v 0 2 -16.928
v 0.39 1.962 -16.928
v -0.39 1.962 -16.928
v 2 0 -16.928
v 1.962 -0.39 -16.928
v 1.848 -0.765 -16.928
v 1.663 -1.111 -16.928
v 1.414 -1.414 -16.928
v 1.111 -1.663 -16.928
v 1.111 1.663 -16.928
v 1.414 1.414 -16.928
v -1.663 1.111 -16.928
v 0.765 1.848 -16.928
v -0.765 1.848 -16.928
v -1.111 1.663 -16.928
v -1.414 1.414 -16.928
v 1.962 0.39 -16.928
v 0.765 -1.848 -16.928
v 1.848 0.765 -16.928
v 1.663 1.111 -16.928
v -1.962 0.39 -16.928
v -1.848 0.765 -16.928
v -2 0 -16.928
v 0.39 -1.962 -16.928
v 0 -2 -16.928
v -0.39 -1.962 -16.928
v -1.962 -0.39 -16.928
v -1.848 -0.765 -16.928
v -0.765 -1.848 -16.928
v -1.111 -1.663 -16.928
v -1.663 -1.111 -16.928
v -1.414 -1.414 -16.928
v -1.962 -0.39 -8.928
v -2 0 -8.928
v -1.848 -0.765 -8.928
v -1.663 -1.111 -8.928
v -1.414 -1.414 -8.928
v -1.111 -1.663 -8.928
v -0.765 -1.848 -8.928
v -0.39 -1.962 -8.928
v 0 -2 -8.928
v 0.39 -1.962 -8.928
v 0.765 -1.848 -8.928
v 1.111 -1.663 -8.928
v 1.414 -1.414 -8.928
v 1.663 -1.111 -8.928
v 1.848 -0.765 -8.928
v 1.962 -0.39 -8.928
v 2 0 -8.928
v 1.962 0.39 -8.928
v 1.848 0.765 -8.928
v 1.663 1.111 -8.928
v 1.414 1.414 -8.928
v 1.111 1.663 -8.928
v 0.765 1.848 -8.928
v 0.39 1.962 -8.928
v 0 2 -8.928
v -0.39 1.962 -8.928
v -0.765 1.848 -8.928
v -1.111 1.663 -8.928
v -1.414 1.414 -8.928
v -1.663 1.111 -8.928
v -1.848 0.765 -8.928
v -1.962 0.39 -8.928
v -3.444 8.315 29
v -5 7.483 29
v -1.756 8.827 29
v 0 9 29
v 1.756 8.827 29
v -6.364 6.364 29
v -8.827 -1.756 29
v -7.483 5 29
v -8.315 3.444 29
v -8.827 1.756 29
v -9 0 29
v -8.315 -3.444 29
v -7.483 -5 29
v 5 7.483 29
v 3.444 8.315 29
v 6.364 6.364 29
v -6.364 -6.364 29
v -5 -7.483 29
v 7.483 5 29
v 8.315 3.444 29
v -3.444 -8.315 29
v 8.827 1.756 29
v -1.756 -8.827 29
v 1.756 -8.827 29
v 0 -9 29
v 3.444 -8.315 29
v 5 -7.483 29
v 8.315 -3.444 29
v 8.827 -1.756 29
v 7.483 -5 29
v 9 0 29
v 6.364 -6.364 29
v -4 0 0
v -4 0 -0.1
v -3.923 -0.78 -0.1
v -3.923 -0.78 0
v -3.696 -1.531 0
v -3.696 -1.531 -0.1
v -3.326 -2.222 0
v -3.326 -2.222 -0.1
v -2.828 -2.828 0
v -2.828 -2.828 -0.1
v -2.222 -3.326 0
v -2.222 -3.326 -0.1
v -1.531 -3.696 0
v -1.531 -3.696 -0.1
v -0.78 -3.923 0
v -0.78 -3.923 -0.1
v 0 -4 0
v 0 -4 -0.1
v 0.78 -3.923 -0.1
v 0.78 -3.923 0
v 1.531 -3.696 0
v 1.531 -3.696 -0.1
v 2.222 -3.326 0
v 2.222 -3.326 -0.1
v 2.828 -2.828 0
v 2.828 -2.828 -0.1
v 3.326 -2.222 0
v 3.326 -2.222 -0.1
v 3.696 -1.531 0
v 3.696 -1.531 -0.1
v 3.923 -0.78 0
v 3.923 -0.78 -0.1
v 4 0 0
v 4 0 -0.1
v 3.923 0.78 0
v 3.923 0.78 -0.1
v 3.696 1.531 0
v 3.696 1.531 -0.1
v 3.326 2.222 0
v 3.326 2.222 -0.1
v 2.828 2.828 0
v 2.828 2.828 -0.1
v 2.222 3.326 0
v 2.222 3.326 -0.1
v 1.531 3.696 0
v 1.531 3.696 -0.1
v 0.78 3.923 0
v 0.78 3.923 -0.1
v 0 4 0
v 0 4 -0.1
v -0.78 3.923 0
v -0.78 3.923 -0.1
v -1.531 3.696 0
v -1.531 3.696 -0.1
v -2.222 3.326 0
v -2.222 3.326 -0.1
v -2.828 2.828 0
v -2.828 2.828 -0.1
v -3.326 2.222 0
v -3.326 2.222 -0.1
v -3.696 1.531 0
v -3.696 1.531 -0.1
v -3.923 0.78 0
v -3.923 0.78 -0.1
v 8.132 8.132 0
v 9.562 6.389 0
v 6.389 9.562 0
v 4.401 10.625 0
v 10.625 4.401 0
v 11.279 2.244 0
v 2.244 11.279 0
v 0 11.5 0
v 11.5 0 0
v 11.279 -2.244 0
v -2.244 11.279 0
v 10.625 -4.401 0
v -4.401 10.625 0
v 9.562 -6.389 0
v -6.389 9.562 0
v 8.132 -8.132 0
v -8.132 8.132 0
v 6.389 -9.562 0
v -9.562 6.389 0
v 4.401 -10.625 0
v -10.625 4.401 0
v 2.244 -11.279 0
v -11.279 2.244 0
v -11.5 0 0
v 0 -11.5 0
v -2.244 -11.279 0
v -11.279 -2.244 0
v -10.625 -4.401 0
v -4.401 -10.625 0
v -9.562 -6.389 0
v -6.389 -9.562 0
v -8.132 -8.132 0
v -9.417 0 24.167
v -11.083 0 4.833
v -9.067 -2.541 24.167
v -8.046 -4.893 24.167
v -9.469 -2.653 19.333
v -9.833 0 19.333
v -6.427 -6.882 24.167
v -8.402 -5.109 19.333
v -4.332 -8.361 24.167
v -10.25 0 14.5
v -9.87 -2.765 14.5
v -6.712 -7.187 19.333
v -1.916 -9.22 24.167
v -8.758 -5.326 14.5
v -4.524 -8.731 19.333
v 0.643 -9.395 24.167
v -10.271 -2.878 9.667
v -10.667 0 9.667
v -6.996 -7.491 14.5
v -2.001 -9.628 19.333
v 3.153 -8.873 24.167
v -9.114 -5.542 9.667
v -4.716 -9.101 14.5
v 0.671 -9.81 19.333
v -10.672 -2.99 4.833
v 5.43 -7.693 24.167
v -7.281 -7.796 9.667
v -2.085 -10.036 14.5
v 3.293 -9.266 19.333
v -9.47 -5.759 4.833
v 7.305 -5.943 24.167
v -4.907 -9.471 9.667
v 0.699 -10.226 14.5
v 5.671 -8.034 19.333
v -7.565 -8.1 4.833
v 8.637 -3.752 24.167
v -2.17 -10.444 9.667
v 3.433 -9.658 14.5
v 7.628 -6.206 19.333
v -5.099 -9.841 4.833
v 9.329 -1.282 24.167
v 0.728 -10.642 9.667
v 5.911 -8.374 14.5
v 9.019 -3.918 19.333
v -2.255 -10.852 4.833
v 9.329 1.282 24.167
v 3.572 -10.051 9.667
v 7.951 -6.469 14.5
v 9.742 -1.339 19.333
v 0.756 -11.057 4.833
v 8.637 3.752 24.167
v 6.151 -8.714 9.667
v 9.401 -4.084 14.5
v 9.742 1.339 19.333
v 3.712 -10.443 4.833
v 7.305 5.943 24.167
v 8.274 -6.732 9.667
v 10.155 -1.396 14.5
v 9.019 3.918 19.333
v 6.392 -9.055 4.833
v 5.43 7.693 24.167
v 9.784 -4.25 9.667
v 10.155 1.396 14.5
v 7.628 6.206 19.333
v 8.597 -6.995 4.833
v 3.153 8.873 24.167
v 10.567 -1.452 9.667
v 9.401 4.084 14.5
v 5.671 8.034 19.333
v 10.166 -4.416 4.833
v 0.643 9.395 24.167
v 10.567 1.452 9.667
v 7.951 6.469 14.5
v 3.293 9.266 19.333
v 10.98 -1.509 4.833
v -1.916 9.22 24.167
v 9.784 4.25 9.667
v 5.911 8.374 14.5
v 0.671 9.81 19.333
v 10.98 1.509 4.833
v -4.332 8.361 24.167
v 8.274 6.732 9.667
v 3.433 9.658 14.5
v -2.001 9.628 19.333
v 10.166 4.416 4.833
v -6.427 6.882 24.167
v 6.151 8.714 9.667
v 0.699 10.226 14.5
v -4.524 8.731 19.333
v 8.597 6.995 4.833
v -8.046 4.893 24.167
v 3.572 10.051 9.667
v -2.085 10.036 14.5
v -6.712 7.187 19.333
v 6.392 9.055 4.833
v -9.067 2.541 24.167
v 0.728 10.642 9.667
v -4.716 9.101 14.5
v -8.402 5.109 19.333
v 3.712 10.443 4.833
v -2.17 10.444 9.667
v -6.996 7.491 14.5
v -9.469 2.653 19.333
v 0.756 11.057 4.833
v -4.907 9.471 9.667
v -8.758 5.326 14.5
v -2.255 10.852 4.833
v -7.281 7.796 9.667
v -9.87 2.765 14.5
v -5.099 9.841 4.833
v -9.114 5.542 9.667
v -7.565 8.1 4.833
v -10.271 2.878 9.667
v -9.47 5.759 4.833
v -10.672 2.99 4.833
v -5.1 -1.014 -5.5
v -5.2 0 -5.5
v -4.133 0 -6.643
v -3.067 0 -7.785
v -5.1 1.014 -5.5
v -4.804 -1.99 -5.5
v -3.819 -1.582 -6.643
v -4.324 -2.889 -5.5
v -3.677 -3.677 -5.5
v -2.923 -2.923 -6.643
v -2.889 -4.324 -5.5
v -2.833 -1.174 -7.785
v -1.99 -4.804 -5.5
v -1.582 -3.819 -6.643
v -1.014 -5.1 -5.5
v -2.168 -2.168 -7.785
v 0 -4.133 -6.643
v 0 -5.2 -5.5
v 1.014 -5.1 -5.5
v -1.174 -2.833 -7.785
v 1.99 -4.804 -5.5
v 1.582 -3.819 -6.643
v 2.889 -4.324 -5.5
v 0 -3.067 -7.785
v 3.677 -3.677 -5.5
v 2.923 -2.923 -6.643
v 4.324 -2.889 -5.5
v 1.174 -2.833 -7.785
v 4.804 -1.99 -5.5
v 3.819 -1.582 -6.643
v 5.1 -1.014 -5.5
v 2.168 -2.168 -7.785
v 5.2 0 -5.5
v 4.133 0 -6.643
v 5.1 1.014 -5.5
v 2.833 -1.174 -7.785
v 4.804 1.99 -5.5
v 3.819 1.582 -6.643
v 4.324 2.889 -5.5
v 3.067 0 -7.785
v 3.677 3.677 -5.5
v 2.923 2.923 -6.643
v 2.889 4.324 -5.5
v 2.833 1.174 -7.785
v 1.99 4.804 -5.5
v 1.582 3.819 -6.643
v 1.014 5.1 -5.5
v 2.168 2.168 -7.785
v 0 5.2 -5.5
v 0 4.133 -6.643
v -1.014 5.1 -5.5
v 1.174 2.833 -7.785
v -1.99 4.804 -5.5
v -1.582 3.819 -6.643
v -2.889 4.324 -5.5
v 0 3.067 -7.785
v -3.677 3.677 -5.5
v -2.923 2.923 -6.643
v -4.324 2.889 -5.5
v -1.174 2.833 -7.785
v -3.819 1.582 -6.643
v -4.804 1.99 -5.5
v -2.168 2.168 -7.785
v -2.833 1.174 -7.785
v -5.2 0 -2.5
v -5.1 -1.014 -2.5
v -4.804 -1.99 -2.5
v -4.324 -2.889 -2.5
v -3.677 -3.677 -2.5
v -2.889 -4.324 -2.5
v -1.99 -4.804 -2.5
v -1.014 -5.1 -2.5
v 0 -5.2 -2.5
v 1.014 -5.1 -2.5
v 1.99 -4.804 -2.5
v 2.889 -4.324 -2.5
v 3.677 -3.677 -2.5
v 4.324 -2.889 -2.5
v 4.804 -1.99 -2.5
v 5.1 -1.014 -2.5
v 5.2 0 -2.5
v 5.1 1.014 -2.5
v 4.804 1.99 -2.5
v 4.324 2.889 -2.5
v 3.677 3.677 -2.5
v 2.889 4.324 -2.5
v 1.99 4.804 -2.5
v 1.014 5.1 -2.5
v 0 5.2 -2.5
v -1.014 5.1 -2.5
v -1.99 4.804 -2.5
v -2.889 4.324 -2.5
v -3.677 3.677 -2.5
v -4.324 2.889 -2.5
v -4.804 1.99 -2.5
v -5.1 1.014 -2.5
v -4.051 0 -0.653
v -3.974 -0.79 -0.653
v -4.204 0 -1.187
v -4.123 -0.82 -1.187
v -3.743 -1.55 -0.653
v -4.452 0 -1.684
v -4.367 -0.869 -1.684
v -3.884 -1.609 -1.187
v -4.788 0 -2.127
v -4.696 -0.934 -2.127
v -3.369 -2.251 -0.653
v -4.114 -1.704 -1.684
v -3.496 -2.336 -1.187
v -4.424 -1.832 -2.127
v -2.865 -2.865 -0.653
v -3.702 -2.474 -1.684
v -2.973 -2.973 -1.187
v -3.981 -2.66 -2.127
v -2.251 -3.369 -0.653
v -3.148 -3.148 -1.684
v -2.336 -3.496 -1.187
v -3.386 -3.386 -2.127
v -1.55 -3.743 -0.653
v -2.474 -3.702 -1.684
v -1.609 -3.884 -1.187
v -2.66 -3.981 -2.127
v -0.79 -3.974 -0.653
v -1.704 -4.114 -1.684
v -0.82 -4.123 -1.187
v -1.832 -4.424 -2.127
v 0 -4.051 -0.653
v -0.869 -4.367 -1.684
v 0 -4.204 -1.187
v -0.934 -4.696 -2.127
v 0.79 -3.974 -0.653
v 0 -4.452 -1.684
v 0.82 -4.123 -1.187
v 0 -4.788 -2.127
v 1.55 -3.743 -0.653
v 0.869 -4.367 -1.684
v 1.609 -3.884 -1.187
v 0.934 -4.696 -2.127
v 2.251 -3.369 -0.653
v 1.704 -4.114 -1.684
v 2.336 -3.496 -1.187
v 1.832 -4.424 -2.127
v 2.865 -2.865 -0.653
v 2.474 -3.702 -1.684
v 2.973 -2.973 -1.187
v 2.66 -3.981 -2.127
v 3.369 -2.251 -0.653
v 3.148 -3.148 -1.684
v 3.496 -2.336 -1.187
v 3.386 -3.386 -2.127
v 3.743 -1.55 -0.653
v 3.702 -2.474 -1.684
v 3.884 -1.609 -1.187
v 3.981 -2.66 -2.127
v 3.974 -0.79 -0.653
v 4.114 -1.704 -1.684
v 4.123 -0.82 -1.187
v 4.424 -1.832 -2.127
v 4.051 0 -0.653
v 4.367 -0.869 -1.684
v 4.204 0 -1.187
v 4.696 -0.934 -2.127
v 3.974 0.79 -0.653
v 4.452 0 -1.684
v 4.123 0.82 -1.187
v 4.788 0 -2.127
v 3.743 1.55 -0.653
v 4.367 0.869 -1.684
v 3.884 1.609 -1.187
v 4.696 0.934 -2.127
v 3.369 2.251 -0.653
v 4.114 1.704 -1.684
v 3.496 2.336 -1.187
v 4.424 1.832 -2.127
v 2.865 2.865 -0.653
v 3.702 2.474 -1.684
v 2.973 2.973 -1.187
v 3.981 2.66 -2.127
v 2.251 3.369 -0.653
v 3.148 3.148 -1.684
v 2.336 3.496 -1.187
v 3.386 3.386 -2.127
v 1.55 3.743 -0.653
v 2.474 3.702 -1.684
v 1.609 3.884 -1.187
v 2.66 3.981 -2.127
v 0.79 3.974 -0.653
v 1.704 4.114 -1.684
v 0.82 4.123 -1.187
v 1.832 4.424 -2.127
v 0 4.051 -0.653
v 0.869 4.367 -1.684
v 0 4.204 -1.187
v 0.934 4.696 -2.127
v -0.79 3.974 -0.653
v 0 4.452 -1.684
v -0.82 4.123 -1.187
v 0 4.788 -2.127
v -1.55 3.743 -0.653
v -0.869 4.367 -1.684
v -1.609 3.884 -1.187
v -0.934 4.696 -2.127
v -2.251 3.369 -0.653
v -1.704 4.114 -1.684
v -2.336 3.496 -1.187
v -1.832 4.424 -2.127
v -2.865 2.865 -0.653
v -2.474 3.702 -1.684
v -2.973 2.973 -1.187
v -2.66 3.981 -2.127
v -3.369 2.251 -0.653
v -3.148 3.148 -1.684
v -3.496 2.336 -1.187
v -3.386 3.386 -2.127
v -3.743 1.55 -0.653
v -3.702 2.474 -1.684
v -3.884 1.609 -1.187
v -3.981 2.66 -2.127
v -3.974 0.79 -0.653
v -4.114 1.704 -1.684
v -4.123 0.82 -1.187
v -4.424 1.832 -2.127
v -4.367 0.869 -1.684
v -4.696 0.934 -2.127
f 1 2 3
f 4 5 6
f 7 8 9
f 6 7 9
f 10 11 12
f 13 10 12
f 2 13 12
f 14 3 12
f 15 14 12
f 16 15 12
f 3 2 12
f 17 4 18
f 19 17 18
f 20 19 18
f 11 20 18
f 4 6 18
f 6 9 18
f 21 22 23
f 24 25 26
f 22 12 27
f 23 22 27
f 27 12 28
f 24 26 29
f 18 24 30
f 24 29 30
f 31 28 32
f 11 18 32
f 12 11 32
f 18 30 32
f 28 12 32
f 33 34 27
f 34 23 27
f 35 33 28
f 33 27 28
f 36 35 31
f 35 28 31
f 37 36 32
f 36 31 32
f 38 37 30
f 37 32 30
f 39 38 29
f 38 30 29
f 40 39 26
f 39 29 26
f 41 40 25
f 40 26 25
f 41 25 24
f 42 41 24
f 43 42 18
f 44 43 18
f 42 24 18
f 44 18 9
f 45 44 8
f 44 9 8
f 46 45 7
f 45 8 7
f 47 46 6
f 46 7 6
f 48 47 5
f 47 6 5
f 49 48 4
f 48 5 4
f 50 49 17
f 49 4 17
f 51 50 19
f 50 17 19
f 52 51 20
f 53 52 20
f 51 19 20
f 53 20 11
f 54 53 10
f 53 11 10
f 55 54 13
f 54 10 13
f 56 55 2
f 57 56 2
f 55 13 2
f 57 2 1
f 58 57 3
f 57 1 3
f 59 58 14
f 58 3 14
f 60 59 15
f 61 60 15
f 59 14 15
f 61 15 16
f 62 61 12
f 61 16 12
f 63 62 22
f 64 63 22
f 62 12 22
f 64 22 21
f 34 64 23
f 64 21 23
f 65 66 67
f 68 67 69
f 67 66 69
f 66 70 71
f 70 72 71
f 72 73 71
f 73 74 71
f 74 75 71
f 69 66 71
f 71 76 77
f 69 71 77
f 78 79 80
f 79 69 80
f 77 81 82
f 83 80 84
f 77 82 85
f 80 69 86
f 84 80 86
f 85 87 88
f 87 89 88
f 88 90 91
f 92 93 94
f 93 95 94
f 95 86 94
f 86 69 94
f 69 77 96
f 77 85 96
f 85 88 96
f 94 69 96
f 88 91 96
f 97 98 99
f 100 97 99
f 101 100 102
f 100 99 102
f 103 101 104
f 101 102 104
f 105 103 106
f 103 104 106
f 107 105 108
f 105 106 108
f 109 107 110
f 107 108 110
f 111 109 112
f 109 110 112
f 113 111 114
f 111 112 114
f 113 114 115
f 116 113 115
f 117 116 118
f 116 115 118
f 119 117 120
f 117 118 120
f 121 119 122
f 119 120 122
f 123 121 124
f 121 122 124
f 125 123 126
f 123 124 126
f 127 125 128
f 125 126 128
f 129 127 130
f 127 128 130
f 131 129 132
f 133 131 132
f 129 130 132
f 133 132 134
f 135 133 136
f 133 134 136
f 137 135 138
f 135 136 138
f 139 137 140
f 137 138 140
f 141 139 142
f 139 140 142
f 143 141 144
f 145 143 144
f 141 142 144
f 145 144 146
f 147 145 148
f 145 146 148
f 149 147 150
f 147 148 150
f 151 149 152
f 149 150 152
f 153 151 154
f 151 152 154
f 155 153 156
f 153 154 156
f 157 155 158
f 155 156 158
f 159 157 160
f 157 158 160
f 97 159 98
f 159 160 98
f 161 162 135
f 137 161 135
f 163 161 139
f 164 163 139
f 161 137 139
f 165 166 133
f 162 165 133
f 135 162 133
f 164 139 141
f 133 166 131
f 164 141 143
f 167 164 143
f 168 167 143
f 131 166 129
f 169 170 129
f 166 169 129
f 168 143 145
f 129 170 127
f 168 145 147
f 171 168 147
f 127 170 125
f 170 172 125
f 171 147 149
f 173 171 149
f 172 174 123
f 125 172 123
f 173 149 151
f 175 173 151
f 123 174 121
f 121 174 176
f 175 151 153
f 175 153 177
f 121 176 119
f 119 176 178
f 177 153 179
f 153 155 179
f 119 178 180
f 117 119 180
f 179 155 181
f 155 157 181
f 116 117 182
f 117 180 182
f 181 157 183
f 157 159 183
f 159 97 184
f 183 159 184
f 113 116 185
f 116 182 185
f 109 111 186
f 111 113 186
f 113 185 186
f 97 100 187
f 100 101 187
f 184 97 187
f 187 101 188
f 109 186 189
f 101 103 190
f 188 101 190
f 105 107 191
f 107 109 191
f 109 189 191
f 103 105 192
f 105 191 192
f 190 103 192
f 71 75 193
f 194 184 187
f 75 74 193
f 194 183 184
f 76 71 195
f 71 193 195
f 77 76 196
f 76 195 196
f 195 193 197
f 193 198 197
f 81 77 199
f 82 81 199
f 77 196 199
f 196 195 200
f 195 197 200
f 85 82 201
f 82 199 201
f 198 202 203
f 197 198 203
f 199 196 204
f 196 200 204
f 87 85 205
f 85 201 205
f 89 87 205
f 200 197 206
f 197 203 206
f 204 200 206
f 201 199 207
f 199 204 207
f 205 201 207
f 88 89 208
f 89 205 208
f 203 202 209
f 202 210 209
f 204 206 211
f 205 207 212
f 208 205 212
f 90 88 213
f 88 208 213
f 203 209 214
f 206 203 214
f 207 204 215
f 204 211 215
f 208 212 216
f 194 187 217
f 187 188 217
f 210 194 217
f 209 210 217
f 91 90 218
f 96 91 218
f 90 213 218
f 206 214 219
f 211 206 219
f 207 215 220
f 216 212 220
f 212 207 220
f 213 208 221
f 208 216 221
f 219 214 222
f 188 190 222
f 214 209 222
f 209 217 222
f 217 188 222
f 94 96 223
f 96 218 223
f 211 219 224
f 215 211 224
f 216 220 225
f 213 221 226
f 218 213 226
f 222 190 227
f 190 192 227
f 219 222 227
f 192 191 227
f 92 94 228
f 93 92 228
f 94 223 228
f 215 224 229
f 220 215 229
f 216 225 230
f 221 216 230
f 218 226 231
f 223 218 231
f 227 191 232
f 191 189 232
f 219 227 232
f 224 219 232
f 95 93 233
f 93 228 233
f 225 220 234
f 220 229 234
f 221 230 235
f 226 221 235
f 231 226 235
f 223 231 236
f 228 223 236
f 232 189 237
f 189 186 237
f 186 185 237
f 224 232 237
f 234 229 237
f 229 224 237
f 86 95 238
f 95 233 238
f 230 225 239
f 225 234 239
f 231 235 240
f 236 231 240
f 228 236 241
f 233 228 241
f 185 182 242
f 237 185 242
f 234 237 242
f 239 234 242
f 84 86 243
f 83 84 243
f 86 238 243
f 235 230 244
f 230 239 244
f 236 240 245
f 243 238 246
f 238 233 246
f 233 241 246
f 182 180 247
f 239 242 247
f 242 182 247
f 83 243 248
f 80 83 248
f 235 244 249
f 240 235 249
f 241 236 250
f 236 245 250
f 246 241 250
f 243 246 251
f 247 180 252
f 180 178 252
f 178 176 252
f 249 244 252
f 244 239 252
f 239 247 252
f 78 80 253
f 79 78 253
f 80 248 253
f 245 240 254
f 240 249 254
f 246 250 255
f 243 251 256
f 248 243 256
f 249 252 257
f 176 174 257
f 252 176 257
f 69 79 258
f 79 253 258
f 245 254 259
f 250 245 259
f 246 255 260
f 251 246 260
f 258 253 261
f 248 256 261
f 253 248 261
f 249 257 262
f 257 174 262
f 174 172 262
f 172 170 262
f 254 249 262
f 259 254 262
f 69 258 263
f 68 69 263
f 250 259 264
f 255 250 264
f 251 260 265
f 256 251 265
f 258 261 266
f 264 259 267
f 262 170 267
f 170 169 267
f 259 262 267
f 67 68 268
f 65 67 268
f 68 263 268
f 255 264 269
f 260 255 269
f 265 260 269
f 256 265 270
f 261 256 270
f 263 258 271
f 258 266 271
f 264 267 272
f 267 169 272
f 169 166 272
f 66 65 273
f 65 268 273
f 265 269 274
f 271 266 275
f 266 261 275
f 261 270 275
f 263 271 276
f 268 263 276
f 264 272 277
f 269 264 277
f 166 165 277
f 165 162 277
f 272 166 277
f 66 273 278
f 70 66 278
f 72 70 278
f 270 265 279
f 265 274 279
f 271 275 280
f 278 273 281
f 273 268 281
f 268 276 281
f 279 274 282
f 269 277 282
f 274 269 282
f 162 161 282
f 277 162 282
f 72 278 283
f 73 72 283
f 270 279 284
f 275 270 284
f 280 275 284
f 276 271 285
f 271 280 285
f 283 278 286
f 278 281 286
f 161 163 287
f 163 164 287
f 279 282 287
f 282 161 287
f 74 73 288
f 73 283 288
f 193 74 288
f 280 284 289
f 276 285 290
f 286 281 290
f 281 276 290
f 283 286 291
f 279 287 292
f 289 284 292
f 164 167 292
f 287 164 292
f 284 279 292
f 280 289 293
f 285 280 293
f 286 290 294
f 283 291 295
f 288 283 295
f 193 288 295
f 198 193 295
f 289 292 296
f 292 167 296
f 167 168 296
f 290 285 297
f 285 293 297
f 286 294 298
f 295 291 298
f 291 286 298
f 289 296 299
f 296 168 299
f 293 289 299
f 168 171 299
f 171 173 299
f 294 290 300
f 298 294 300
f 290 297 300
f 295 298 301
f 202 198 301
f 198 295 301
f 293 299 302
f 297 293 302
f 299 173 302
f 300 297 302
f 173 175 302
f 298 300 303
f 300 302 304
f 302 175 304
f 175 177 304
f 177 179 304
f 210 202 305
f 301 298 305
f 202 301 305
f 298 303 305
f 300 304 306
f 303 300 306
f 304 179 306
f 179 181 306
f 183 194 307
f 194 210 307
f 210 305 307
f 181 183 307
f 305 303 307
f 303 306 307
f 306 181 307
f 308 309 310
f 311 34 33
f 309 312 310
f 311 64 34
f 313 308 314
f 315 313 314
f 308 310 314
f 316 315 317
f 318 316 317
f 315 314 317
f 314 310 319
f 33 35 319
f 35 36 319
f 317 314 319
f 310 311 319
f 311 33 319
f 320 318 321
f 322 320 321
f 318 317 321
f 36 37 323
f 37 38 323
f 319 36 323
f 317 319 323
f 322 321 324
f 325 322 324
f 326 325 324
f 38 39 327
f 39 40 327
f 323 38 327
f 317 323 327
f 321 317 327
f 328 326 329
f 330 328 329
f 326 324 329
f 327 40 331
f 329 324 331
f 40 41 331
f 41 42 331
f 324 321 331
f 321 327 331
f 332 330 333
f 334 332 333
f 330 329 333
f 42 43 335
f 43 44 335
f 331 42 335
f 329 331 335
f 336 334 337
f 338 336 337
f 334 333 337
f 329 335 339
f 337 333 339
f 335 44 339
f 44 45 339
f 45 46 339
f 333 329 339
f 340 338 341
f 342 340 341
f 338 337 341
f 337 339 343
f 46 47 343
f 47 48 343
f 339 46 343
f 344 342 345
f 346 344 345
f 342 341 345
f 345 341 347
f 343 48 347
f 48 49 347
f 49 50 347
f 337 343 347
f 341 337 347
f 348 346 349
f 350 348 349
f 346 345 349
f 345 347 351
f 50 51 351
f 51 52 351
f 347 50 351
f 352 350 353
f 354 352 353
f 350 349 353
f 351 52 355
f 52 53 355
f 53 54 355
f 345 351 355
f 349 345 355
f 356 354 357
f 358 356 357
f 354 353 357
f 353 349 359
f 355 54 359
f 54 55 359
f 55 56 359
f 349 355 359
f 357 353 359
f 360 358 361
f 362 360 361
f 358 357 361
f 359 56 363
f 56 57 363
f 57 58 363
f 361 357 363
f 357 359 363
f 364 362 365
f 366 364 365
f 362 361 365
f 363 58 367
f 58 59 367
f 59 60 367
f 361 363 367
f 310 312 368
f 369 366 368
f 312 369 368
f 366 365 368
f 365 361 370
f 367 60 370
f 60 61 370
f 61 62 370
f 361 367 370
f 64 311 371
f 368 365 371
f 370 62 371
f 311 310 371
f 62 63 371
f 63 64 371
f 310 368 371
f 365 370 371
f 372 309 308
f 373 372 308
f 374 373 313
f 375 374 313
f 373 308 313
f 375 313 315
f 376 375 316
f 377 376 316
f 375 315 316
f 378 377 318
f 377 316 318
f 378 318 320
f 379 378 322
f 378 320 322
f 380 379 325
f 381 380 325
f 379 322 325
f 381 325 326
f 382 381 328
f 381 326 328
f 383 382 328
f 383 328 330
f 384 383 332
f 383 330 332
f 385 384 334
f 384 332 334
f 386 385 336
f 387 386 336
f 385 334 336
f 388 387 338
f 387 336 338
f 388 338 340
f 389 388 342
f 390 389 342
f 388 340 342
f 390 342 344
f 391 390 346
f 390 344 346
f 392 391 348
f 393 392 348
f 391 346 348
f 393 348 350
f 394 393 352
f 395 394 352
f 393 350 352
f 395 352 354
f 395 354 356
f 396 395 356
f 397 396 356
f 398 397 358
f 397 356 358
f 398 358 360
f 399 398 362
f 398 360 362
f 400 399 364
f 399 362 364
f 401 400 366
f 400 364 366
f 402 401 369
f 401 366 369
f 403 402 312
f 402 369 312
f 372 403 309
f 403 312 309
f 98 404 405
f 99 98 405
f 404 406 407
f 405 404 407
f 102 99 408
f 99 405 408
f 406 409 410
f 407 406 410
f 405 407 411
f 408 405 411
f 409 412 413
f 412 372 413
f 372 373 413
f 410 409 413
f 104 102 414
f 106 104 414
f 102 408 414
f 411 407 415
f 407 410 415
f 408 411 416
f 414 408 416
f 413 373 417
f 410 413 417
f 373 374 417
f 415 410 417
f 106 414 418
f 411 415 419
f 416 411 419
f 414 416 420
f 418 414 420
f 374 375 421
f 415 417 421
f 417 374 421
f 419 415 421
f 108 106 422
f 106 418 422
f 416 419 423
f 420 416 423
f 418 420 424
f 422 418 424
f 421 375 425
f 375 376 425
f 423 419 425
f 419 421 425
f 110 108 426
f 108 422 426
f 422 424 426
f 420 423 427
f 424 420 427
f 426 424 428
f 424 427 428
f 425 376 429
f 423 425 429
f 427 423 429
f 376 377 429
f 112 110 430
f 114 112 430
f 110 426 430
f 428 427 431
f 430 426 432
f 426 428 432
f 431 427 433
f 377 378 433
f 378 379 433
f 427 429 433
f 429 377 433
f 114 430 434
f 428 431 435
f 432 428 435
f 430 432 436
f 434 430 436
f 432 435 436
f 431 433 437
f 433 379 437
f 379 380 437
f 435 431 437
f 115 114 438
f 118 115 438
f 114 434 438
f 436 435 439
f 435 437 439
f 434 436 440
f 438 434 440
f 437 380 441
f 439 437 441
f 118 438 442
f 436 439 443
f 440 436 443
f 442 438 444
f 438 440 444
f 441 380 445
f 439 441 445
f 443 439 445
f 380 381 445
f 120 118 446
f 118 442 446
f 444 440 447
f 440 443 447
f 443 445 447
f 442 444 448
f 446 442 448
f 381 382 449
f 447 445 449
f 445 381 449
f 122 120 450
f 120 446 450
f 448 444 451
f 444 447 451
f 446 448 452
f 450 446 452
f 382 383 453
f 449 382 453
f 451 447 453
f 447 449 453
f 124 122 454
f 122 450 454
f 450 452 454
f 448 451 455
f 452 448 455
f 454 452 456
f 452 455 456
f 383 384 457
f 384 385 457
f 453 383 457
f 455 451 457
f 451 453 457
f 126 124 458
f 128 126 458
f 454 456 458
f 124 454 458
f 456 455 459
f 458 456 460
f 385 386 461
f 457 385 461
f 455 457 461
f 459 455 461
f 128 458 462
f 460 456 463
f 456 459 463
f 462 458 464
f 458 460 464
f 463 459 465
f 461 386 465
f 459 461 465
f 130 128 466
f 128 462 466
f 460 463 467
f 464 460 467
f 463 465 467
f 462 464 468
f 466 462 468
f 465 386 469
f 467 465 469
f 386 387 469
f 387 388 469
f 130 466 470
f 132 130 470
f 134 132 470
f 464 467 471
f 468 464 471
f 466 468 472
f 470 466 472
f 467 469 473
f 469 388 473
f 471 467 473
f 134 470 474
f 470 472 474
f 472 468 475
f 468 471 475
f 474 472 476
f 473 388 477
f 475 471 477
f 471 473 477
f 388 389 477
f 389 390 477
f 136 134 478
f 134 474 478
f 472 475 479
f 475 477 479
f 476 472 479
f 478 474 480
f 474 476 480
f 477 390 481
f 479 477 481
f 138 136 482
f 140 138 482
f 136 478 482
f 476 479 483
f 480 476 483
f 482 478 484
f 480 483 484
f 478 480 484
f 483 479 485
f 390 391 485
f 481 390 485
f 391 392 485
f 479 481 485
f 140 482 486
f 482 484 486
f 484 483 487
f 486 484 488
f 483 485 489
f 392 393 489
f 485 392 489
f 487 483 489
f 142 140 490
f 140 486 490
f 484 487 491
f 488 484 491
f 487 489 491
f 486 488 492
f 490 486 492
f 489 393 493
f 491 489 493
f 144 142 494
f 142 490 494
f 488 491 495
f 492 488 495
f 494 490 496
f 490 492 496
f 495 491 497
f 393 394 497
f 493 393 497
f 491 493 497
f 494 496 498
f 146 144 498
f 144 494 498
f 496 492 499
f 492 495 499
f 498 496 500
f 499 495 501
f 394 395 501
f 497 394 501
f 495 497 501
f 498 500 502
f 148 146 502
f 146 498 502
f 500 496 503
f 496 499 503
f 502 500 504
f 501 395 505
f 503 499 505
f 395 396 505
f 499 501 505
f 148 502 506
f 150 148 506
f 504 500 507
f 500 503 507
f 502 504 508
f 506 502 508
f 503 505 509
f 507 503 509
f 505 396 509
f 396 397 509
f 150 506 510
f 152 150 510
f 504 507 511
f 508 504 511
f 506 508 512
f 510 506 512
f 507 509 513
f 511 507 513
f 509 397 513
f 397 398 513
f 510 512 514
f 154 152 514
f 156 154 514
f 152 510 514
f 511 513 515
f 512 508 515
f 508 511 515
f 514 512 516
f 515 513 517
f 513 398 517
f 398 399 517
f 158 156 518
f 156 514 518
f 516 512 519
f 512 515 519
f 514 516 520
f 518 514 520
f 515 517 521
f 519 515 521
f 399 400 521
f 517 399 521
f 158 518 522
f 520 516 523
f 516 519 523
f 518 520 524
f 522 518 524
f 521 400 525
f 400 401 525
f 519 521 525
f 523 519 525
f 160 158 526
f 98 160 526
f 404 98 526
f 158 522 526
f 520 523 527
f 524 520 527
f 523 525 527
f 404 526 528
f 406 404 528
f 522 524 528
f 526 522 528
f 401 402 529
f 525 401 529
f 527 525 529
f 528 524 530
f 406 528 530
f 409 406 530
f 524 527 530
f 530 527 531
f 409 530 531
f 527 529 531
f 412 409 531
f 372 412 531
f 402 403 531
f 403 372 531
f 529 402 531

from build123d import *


# Not quite as in the source:
# - a fillet or chamfer that OpenCascade refuses, or shapes differently, is made with other operations: its cross-section is extruded or revolved along the edge and cut away or added


with BuildPart() as f1:
    # F0 (on Front) → F1 (revolve)
    with BuildSketch(Plane.XZ):
        Polygon((0, -16.9278544536), (0, 0), (0, 29), (-9, 29), (-11.5, 0), (-4, 0), (-4, -2.5), (-5.2, -2.5), (-5.2, -5.5), (-2, -8.9278544536), (-2, -16.9278544536), align=None)
    revolve(axis=Axis((0, 0, 14.5), (0, 0, 1)))

    # F2: fillet of radius 3 on 1 edges, made by hand

    # F2_s1 → F2_t2 (revolve)
    with BuildSketch(Plane.XZ):
        with BuildLine():
            ThreePointArc((-4, -0.1), (-4.316718427, -1.4416407865), (-5.2, -2.5))
            Line((-5.2, -2.5), (-5.164, -2.548))
            ThreePointArc((-5.164, -2.548), (-4.6, -2.56), (-4, -2.56))
            Line((-4, -2.56), (-3.94, -2.5))
            Line((-3.94, -2.5), (-3.94, -0.1))
            Line((-3.94, -0.1), (-4, -0.1))
        make_face()
    revolve(axis=Axis((0, 0, -2.5), (0, 0, 1)))


solid = f1.part
